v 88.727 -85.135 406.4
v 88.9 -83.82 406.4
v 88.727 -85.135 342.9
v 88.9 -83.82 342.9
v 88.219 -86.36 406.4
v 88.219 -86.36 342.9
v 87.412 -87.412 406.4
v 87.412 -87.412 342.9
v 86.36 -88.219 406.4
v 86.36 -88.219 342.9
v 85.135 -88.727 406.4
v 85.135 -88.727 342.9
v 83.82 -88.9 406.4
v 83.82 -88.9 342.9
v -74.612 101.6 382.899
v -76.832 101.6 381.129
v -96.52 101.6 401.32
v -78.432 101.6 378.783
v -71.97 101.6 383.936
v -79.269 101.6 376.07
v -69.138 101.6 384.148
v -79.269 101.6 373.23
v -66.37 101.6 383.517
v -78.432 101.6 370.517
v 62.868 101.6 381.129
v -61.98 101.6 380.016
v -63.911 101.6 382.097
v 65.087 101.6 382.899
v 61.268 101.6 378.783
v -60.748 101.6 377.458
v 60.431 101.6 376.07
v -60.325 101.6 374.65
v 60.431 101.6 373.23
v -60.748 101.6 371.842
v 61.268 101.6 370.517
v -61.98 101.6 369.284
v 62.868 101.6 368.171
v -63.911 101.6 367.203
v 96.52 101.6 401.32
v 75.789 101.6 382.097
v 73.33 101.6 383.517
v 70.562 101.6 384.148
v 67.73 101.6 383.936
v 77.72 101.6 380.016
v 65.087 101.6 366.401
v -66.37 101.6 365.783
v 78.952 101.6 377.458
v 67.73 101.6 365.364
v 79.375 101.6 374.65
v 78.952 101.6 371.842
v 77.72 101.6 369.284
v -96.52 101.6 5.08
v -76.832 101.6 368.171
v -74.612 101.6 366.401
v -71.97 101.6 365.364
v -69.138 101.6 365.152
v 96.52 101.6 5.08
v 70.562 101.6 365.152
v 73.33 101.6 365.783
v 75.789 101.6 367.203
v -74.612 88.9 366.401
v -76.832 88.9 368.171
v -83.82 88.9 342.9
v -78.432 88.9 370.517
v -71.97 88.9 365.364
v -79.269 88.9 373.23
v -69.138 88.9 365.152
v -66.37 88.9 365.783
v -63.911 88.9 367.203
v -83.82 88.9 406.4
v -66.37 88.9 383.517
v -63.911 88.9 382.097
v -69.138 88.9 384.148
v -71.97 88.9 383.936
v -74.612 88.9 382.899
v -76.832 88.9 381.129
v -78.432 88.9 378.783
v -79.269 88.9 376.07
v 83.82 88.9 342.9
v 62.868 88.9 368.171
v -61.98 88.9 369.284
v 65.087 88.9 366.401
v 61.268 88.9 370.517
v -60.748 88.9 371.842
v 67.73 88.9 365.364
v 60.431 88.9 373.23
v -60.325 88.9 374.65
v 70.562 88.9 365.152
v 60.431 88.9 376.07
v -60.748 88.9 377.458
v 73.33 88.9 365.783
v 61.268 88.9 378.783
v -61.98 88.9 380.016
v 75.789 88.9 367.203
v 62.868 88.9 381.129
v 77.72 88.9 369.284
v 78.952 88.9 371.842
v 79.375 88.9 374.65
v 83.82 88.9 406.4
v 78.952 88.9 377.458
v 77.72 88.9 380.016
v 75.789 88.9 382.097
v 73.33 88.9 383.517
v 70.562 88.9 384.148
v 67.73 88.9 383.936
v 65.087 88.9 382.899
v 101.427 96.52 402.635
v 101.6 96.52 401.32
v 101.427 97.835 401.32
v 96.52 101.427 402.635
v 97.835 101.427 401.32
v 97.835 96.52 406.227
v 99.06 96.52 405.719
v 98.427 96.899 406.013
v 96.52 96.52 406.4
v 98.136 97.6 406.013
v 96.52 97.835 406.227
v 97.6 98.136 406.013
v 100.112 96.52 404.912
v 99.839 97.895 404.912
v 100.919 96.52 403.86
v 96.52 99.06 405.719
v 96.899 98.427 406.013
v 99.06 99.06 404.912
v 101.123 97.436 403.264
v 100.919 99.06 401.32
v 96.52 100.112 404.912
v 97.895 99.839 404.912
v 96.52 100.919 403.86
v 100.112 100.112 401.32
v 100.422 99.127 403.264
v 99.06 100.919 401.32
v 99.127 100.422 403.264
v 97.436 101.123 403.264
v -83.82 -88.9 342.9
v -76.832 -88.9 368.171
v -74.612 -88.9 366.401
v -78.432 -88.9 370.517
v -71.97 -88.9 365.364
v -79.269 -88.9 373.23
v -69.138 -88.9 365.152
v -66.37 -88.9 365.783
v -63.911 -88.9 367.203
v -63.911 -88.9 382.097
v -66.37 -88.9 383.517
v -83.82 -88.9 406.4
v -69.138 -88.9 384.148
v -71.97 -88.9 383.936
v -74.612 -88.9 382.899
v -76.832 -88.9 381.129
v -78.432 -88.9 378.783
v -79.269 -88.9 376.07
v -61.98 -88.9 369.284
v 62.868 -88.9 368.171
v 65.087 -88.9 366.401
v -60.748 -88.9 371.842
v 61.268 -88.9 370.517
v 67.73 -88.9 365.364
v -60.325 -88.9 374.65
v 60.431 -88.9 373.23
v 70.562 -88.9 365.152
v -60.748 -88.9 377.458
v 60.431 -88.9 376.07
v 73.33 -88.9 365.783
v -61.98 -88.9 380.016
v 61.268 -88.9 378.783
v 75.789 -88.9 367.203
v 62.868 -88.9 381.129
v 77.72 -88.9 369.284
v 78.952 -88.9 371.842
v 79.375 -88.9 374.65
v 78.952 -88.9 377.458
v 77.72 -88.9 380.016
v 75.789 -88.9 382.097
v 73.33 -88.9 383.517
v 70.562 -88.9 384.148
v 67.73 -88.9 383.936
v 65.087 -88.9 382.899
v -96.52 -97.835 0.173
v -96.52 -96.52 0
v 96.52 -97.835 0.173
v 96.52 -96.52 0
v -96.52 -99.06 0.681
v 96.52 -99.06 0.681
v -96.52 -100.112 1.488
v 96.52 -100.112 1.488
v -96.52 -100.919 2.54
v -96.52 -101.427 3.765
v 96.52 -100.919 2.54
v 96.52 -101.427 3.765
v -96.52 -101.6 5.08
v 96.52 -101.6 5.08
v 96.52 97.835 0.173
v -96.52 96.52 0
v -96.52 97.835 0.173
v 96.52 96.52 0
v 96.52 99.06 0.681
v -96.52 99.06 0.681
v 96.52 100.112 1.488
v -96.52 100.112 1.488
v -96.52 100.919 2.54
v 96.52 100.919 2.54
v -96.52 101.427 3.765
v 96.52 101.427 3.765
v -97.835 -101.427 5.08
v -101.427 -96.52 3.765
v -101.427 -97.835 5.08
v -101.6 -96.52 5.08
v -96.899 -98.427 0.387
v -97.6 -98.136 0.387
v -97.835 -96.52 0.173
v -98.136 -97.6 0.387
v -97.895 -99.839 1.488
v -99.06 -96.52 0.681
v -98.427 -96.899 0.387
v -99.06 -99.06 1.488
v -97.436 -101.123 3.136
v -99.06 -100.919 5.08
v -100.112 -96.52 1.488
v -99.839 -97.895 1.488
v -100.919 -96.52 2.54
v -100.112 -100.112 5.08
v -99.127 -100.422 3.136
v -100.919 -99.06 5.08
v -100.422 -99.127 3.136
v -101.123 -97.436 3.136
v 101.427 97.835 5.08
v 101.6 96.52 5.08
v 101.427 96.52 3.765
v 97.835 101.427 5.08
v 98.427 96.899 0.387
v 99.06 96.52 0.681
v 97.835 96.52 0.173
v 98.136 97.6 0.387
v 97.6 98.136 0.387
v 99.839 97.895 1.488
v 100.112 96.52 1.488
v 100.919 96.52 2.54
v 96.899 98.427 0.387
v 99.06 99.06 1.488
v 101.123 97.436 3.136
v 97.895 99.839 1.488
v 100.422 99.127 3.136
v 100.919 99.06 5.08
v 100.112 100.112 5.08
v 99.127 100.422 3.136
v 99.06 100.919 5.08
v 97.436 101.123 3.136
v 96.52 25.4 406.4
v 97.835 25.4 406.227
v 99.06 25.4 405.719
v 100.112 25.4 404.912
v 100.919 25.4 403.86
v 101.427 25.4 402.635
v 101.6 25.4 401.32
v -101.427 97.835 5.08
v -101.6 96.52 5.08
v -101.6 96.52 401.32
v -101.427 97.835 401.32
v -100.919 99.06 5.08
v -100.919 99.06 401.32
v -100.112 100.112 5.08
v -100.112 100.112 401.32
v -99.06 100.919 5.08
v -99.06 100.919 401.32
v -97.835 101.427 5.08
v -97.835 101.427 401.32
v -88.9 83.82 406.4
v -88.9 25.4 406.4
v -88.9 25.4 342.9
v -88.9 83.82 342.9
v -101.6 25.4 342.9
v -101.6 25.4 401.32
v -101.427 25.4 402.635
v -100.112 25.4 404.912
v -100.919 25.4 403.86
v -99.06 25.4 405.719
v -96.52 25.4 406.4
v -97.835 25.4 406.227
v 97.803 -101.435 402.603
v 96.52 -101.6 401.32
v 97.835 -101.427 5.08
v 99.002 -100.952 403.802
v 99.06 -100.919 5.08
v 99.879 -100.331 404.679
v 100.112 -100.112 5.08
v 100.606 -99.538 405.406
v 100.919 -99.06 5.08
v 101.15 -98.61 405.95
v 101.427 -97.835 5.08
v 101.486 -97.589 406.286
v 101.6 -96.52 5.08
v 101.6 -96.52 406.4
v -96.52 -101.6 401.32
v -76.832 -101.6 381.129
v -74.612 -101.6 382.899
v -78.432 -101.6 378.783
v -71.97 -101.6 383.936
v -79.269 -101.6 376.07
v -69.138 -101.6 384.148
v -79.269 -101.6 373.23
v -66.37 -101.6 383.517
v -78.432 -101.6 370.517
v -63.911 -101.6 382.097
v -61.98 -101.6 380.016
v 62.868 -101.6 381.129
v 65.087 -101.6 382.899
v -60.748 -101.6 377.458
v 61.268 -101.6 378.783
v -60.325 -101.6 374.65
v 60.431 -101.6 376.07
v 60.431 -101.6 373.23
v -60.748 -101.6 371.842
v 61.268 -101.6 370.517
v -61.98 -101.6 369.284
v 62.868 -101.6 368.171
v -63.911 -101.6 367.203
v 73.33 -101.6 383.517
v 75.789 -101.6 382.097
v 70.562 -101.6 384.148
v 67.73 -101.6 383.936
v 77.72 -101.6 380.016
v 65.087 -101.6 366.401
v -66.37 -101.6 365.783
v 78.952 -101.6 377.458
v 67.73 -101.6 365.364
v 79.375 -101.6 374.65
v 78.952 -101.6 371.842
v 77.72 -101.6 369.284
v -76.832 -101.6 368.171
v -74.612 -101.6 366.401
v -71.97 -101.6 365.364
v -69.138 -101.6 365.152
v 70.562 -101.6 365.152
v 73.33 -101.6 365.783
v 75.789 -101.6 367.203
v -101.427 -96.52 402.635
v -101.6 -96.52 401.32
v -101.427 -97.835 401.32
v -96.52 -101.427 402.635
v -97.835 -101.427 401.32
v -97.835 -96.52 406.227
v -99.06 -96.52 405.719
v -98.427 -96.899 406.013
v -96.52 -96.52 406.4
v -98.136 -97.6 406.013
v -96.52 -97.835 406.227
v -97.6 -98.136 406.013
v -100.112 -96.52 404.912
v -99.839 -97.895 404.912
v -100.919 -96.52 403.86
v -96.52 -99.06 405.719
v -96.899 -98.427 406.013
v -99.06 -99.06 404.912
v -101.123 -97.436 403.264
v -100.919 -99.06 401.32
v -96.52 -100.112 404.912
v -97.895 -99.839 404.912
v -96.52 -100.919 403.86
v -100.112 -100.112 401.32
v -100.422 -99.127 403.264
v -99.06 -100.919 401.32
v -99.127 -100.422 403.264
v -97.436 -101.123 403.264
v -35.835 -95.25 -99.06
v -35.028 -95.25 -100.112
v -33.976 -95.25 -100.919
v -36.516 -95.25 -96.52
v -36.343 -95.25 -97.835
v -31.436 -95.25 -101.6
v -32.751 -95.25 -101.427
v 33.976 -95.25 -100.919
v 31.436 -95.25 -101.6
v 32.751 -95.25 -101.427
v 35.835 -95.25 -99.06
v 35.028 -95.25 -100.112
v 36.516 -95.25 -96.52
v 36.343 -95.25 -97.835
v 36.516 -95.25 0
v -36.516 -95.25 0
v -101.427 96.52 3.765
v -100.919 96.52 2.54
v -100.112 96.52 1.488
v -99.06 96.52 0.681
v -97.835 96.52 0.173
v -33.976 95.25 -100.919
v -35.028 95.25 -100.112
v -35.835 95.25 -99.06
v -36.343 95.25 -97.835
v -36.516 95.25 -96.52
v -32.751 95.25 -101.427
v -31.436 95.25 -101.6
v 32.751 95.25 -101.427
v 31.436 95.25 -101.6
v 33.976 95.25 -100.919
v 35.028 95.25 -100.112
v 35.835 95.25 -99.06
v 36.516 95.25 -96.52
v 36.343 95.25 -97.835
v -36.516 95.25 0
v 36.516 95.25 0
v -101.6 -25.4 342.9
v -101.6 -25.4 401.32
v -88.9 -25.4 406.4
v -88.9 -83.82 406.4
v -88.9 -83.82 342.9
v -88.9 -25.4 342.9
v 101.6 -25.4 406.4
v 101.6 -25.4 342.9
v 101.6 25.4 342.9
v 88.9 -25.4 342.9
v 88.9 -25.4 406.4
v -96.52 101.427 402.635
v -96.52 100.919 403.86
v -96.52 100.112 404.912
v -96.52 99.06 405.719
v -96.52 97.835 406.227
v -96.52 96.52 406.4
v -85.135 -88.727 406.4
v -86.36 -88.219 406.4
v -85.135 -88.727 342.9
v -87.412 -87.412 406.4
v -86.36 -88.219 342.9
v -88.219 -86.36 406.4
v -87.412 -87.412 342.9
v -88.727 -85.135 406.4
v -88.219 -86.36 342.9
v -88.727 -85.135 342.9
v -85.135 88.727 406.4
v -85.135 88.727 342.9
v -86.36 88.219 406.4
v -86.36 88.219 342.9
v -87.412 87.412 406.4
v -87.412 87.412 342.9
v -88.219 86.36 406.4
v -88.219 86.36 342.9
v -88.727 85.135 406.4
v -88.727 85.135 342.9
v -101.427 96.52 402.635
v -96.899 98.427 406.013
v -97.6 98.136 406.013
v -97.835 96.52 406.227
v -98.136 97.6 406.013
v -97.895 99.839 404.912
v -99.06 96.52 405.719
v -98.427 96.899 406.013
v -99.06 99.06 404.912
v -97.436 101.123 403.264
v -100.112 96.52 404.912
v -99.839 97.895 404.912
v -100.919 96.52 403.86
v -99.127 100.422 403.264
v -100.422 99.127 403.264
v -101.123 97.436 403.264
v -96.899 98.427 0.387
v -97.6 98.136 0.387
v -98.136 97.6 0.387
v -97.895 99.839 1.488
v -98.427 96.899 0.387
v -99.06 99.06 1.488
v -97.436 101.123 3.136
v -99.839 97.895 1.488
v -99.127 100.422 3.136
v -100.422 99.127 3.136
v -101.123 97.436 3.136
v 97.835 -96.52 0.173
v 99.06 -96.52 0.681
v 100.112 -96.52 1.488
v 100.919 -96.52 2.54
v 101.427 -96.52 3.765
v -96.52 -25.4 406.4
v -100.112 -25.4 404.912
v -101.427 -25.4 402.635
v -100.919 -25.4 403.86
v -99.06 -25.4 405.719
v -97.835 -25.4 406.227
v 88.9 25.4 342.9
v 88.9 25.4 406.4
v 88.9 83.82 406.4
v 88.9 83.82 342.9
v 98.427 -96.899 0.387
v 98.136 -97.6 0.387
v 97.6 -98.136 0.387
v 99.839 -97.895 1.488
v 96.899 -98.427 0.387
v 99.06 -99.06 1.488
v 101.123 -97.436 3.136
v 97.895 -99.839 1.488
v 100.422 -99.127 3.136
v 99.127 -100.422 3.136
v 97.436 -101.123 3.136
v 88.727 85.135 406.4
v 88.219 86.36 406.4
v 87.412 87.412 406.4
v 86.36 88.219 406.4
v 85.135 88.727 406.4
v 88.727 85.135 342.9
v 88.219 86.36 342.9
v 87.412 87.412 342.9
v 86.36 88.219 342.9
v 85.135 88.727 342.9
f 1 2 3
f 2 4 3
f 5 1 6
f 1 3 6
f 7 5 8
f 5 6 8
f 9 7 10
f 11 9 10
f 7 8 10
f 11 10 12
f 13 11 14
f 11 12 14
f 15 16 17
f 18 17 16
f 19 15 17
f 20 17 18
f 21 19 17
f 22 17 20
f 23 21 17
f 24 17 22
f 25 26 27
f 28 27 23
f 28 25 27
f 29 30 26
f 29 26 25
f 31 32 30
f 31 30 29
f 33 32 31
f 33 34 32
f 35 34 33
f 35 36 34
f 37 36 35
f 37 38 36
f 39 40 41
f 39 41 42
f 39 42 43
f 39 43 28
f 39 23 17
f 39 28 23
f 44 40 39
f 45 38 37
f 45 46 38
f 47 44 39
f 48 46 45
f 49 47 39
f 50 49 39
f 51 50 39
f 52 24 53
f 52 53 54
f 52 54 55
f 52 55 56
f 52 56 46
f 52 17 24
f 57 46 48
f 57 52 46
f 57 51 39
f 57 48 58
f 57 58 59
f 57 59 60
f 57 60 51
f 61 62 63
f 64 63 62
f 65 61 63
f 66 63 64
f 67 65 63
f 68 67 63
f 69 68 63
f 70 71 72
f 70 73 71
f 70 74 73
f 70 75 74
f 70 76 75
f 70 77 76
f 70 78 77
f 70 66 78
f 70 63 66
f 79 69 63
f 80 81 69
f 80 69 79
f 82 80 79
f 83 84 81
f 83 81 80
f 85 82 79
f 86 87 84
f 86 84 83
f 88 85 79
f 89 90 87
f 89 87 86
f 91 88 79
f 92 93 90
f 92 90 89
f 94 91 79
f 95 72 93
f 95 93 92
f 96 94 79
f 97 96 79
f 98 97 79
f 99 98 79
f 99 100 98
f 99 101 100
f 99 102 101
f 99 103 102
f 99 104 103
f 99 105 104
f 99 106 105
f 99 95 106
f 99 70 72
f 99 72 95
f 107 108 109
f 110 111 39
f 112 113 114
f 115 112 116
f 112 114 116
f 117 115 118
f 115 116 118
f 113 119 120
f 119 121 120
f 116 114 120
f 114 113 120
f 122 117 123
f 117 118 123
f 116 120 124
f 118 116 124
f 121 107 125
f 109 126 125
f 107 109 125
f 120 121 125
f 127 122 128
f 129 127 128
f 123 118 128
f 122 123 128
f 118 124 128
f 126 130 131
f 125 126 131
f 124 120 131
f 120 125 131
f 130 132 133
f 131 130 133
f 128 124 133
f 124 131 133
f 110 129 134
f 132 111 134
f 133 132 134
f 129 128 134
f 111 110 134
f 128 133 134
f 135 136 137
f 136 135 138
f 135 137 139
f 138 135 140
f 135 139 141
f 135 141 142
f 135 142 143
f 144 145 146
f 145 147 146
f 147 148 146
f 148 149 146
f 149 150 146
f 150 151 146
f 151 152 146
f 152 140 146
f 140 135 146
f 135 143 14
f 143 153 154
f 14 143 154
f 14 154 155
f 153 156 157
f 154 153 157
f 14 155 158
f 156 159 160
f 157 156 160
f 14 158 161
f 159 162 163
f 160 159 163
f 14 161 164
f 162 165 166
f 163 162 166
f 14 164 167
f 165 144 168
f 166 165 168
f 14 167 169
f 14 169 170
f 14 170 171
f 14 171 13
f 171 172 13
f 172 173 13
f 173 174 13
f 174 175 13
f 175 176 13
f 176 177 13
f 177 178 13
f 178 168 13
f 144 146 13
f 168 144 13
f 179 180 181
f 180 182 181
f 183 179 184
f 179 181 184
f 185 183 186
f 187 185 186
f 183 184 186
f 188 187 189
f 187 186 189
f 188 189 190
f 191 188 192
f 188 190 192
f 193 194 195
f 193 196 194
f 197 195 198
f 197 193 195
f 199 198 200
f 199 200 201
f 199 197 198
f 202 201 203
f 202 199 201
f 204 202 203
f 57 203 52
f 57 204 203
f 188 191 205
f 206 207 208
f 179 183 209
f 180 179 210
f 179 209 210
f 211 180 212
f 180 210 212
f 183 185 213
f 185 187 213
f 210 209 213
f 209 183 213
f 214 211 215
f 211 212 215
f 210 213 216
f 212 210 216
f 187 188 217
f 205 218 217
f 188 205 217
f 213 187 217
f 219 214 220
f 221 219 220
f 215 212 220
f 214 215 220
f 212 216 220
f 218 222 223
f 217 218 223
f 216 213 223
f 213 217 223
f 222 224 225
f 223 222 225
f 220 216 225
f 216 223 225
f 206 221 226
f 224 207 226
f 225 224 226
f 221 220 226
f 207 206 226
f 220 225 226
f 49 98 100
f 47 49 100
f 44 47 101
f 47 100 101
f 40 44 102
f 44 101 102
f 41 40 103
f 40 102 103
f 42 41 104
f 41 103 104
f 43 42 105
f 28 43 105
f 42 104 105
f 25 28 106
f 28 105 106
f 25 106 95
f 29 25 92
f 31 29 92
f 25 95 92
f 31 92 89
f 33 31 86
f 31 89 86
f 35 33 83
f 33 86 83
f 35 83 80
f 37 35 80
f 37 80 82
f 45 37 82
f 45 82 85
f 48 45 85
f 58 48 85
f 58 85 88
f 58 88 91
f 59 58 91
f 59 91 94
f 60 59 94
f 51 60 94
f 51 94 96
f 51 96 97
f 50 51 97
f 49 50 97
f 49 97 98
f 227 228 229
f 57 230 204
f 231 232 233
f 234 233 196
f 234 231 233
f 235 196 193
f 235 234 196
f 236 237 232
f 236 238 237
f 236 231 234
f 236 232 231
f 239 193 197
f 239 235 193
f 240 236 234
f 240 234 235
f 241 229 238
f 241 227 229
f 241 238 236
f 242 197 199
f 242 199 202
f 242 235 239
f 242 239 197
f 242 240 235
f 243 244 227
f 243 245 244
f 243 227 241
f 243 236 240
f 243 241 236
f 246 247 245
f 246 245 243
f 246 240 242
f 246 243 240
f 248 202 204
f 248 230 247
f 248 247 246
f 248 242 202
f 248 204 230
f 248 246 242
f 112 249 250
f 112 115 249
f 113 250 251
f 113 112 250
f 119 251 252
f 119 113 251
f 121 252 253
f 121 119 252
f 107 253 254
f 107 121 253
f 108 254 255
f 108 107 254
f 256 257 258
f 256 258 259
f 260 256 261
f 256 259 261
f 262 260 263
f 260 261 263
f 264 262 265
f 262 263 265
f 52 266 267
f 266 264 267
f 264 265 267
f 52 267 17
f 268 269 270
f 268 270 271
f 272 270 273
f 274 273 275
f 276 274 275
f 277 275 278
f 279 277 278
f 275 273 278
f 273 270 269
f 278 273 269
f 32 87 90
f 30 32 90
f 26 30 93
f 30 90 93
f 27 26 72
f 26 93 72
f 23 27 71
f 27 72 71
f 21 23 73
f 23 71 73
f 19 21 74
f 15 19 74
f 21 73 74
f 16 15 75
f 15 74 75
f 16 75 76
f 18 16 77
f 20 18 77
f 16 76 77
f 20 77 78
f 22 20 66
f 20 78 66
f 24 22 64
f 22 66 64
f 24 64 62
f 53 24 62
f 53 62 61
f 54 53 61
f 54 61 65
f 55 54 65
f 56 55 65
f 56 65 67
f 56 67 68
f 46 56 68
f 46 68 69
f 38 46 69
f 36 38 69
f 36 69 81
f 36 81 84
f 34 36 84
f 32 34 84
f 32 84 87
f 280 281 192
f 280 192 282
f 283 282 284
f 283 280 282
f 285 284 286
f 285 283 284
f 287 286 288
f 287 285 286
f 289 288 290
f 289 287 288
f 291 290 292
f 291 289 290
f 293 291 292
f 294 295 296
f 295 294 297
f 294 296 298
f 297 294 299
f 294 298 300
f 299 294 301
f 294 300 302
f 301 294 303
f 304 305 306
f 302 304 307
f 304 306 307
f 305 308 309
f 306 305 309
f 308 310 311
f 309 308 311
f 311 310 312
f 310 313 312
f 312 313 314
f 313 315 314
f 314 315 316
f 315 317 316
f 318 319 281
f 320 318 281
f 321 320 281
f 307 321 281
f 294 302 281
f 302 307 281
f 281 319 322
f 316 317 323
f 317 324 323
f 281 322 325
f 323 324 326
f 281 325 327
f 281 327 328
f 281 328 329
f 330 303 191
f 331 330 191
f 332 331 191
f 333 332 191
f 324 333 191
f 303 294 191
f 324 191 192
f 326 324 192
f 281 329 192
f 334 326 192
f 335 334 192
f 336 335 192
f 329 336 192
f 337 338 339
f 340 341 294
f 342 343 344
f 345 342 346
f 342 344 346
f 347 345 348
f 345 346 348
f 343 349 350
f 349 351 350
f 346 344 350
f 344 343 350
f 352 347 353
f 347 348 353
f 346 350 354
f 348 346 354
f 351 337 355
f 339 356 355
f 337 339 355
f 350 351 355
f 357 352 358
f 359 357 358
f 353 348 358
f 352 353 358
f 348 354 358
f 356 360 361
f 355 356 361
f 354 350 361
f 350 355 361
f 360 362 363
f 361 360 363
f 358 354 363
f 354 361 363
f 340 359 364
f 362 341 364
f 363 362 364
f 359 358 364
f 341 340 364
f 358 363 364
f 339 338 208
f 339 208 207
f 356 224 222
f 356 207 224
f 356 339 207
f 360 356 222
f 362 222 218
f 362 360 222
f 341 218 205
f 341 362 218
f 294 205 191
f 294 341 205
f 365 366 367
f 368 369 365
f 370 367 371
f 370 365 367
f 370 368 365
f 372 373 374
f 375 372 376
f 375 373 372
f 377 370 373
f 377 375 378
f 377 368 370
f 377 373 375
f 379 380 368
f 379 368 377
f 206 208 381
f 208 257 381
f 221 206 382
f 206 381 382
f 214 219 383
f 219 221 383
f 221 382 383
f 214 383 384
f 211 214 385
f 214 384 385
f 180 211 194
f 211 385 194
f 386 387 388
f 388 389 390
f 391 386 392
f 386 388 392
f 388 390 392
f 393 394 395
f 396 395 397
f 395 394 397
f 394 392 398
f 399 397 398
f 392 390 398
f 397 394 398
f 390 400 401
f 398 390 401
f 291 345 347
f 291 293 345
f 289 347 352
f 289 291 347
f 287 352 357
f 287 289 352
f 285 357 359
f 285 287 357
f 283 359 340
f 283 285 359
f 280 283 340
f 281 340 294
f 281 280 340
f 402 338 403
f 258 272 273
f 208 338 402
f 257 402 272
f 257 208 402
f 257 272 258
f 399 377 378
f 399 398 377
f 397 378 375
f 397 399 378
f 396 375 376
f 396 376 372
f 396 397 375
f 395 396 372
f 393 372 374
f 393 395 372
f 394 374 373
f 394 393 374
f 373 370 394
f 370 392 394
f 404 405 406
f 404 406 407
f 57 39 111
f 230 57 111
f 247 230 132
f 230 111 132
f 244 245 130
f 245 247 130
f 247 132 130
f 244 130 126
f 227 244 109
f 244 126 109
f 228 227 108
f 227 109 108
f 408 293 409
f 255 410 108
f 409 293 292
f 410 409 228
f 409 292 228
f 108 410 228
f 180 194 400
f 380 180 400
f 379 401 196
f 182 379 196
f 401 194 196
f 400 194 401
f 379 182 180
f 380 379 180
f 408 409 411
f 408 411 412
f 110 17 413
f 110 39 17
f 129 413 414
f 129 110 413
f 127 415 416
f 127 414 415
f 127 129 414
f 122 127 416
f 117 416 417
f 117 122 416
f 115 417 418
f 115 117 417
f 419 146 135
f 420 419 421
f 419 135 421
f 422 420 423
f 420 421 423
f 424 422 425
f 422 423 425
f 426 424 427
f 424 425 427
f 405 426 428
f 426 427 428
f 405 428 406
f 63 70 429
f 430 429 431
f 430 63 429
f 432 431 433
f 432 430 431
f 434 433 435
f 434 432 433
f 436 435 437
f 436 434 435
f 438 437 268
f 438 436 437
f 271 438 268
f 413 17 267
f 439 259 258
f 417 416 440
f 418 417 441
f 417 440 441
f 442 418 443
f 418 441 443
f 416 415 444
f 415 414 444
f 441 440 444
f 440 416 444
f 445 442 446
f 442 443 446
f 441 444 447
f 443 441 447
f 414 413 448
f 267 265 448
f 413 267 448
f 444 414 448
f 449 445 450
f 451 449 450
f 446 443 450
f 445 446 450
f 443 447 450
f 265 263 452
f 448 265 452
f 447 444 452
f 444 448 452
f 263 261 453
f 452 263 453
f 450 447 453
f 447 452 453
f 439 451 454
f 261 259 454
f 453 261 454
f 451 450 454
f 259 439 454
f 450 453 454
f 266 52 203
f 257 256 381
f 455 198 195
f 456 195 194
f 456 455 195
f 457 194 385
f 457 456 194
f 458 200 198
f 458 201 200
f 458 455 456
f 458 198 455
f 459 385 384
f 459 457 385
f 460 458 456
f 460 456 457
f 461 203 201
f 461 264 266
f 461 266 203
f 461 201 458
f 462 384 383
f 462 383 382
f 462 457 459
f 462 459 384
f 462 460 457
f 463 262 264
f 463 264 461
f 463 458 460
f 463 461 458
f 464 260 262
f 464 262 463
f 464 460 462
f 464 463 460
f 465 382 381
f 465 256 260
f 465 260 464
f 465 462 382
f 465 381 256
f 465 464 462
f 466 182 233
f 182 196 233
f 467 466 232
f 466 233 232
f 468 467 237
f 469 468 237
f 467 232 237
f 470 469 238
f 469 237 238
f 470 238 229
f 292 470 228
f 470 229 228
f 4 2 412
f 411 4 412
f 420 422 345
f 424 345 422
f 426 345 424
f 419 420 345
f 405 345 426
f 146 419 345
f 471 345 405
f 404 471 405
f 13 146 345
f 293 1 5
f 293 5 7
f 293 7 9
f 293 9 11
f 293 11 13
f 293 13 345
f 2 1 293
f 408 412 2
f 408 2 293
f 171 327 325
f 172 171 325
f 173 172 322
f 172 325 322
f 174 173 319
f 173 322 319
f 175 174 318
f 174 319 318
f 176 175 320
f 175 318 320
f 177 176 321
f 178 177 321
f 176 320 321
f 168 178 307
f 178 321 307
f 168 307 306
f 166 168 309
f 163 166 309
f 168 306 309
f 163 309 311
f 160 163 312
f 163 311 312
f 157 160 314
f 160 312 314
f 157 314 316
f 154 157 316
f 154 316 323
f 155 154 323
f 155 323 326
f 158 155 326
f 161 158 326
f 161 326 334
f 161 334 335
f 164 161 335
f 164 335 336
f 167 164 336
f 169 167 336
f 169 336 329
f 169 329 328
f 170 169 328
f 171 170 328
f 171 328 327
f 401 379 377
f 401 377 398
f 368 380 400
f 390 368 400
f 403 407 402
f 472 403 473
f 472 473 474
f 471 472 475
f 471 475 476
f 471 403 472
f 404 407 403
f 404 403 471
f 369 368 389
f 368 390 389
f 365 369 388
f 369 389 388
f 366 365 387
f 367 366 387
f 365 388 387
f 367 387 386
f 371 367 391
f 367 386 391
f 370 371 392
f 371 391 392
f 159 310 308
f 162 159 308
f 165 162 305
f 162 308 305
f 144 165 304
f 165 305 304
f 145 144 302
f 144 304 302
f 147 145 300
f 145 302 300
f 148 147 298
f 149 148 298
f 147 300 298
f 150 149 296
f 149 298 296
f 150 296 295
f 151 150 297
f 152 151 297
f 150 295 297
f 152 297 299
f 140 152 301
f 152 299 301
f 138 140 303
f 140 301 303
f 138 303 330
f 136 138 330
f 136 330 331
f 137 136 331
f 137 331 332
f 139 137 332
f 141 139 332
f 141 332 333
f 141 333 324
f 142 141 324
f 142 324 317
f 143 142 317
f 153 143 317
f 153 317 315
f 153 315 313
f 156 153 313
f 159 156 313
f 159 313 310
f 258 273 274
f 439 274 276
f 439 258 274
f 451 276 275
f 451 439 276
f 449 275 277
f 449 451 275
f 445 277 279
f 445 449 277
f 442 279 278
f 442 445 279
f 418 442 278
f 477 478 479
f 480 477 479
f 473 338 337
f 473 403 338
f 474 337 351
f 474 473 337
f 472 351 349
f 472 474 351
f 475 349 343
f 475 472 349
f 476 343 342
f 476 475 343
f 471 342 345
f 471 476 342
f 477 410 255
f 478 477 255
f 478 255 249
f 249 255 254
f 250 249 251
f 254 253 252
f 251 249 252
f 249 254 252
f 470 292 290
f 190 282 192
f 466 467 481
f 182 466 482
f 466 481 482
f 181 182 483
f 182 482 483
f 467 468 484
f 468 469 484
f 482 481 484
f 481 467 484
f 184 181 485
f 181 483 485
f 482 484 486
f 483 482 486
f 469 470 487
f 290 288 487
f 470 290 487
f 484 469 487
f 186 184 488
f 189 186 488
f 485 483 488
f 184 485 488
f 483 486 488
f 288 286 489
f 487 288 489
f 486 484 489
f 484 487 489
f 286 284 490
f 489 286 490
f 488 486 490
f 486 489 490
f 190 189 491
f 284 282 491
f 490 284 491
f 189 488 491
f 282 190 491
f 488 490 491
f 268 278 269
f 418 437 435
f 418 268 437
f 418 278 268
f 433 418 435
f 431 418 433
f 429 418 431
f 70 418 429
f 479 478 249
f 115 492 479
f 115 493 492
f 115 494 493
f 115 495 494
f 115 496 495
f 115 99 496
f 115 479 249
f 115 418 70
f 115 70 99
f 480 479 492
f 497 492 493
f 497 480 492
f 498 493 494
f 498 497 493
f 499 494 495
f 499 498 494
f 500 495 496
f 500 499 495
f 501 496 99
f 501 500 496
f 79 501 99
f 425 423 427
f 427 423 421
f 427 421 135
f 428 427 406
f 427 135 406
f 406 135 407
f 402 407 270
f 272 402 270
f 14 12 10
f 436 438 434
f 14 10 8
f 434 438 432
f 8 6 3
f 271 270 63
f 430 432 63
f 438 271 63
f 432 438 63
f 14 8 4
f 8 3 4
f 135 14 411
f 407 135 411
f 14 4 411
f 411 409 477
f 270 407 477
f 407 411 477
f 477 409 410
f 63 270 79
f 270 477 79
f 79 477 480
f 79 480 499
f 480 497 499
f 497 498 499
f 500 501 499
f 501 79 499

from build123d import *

# Parameters (mm, degrees)
F0_W     = 203.2
F0_H     = 203.2
F1_DEPTH = 406.4
F2_W     = 177.8
F2_H     = 177.8
F3_DEPTH = 63.5
F4_R     = 9.525
F5_DEPTH = 205.74
F6_W     = 50.8
F6_H     = 63.5
F7_DEPTH = 228.6
F8_W     = 73.0317101263
F8_H     = 190.5
F9_DEPTH = 101.6
F10_R    = 5.08


with BuildPart() as f1:
    # F0 (on Top) → F1 (new body)
    with BuildSketch(Plane.XY):
        Rectangle(F0_W, F0_H)
    extrude(amount=F1_DEPTH)

    # F2 (on face) → F3 (cut)
    with BuildSketch(Plane.XY.offset(406.4)):
        Rectangle(F2_W, F2_H)
    extrude(amount=-F3_DEPTH, mode=Mode.SUBTRACT)

    # F4 (on face) → F5 (cut)
    with BuildSketch(Plane.XZ.offset(101.6)):
        with Locations((-69.85, 374.65)):
            Circle(F4_R)
        with Locations((69.85, 374.65)):
            Circle(F4_R)
    extrude(amount=-F5_DEPTH, mode=Mode.SUBTRACT)

    # F6 (on face) → F7 (cut)
    with BuildSketch(Plane.YZ.offset(101.6)):
        with Locations((0, 374.65)):
            Rectangle(F6_W, F6_H)
    extrude(amount=-F7_DEPTH, mode=Mode.SUBTRACT)

    # F8 (on face) → F9 (join)
    with BuildSketch(Plane.XY):
        Rectangle(F8_W, F8_H)
    extrude(amount=-F9_DEPTH)

    # F10
    f10_edges = [f1.edges().sort_by_distance(p)[0] for p in [
        (-101.6, 101.6, 203.2),
        (-101.6, -101.6, 203.2),
        (101.6, 101.6, 203.2),
        (101.6, 63.5, 406.4),
        (0, 101.6, 406.4),
        (-101.6, 63.5, 406.4),
        (-101.6, -63.5, 406.4),
        (0, -101.6, 406.4),
        (101.6, -101.6, 203.2),
        (101.6, 0, 0),
        (0, -101.6, 0),
        (0, 101.6, 0),
        (-101.6, 0, 0),
        (-88.9, -88.9, 374.65),
        (-88.9, 88.9, 374.65),
        (88.9, -88.9, 374.65),
        (88.9, 88.9, 374.65),
        (36.515855, 0, -101.6),
        (-36.515855, 0, -101.6),
    ]]
    fillet(f10_edges, radius=F10_R)


solid = f1.part
